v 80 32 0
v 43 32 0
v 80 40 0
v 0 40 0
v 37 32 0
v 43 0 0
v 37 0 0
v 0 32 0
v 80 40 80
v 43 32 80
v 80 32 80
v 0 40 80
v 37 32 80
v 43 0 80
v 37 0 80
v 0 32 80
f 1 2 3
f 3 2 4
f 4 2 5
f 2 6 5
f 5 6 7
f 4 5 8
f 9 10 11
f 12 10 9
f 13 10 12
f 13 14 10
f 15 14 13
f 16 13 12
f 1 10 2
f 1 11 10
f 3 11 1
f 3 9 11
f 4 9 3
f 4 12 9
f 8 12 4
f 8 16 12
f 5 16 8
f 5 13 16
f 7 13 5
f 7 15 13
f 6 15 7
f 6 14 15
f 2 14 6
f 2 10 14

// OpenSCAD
$fn = 32;

// ----------------------------------------------------------------------
// Structural section: tee 80 x 40 mm
// ----------------------------------------------------------------------

// --- parameters (mm) ---
sec_w = 80;               // tee width, X
sec_h = 40;               // tee height, Y
flange_t = 8;             // top flange thickness
web_t = 6;                // web thickness
plate_t = 80;             // cut length, Z (extrusion height)
fit_tol = 0.02;           // declared fit tolerance (prompt contract)
free_tol = 0.2;           // declared free tolerance (prompt contract)

profile = [[37, 0], [43, 0], [43, 32], [80, 32], [80, 40], [0, 40], [0, 32], [37, 32]];  // primary outline, 8 points, counter clockwise

// --- the one profile operation ---
linear_extrude(height = plate_t) polygon(points = profile);
